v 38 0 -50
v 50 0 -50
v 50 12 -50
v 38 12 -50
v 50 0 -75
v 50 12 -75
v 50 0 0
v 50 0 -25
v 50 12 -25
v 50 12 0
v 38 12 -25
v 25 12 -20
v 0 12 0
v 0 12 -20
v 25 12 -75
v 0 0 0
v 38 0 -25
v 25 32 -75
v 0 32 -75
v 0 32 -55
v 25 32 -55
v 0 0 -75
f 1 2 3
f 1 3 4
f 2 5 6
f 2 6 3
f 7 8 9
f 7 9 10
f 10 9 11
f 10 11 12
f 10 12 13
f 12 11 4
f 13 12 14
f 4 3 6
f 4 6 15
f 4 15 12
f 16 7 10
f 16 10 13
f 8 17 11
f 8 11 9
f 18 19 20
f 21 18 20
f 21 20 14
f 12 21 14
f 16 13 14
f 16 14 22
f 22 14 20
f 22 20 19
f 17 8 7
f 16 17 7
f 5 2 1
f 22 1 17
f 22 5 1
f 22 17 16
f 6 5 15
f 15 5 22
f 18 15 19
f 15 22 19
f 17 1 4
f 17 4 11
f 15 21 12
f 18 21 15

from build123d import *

# Parameters (mm, degrees)
BOSS_EXTRUDE1_DEPTH = 12
BOSS_EXTRUDE3_DEPTH = 25


with BuildPart() as part:
    # Sketch1 → Boss-Extrude1 (new body)
    with BuildSketch(Plane(origin=(0, 0, 0), x_dir=(1, 0, 0), z_dir=(0, 1, 0))):
        Polygon((0, 0), (0, 75), (50, 75), (50, 50), (38, 50), (38, 25), (50, 25), (50, 0), align=None)
    extrude(amount=BOSS_EXTRUDE1_DEPTH)

    # Sketch6 → Boss-Extrude3 (add)
    with BuildSketch(Plane.ZY):
        Polygon((-55, 32), (-20, 12), (-55, 12), (-75, 12), (-75, 32), align=None)
    extrude(amount=-BOSS_EXTRUDE3_DEPTH)


solid = part.part
